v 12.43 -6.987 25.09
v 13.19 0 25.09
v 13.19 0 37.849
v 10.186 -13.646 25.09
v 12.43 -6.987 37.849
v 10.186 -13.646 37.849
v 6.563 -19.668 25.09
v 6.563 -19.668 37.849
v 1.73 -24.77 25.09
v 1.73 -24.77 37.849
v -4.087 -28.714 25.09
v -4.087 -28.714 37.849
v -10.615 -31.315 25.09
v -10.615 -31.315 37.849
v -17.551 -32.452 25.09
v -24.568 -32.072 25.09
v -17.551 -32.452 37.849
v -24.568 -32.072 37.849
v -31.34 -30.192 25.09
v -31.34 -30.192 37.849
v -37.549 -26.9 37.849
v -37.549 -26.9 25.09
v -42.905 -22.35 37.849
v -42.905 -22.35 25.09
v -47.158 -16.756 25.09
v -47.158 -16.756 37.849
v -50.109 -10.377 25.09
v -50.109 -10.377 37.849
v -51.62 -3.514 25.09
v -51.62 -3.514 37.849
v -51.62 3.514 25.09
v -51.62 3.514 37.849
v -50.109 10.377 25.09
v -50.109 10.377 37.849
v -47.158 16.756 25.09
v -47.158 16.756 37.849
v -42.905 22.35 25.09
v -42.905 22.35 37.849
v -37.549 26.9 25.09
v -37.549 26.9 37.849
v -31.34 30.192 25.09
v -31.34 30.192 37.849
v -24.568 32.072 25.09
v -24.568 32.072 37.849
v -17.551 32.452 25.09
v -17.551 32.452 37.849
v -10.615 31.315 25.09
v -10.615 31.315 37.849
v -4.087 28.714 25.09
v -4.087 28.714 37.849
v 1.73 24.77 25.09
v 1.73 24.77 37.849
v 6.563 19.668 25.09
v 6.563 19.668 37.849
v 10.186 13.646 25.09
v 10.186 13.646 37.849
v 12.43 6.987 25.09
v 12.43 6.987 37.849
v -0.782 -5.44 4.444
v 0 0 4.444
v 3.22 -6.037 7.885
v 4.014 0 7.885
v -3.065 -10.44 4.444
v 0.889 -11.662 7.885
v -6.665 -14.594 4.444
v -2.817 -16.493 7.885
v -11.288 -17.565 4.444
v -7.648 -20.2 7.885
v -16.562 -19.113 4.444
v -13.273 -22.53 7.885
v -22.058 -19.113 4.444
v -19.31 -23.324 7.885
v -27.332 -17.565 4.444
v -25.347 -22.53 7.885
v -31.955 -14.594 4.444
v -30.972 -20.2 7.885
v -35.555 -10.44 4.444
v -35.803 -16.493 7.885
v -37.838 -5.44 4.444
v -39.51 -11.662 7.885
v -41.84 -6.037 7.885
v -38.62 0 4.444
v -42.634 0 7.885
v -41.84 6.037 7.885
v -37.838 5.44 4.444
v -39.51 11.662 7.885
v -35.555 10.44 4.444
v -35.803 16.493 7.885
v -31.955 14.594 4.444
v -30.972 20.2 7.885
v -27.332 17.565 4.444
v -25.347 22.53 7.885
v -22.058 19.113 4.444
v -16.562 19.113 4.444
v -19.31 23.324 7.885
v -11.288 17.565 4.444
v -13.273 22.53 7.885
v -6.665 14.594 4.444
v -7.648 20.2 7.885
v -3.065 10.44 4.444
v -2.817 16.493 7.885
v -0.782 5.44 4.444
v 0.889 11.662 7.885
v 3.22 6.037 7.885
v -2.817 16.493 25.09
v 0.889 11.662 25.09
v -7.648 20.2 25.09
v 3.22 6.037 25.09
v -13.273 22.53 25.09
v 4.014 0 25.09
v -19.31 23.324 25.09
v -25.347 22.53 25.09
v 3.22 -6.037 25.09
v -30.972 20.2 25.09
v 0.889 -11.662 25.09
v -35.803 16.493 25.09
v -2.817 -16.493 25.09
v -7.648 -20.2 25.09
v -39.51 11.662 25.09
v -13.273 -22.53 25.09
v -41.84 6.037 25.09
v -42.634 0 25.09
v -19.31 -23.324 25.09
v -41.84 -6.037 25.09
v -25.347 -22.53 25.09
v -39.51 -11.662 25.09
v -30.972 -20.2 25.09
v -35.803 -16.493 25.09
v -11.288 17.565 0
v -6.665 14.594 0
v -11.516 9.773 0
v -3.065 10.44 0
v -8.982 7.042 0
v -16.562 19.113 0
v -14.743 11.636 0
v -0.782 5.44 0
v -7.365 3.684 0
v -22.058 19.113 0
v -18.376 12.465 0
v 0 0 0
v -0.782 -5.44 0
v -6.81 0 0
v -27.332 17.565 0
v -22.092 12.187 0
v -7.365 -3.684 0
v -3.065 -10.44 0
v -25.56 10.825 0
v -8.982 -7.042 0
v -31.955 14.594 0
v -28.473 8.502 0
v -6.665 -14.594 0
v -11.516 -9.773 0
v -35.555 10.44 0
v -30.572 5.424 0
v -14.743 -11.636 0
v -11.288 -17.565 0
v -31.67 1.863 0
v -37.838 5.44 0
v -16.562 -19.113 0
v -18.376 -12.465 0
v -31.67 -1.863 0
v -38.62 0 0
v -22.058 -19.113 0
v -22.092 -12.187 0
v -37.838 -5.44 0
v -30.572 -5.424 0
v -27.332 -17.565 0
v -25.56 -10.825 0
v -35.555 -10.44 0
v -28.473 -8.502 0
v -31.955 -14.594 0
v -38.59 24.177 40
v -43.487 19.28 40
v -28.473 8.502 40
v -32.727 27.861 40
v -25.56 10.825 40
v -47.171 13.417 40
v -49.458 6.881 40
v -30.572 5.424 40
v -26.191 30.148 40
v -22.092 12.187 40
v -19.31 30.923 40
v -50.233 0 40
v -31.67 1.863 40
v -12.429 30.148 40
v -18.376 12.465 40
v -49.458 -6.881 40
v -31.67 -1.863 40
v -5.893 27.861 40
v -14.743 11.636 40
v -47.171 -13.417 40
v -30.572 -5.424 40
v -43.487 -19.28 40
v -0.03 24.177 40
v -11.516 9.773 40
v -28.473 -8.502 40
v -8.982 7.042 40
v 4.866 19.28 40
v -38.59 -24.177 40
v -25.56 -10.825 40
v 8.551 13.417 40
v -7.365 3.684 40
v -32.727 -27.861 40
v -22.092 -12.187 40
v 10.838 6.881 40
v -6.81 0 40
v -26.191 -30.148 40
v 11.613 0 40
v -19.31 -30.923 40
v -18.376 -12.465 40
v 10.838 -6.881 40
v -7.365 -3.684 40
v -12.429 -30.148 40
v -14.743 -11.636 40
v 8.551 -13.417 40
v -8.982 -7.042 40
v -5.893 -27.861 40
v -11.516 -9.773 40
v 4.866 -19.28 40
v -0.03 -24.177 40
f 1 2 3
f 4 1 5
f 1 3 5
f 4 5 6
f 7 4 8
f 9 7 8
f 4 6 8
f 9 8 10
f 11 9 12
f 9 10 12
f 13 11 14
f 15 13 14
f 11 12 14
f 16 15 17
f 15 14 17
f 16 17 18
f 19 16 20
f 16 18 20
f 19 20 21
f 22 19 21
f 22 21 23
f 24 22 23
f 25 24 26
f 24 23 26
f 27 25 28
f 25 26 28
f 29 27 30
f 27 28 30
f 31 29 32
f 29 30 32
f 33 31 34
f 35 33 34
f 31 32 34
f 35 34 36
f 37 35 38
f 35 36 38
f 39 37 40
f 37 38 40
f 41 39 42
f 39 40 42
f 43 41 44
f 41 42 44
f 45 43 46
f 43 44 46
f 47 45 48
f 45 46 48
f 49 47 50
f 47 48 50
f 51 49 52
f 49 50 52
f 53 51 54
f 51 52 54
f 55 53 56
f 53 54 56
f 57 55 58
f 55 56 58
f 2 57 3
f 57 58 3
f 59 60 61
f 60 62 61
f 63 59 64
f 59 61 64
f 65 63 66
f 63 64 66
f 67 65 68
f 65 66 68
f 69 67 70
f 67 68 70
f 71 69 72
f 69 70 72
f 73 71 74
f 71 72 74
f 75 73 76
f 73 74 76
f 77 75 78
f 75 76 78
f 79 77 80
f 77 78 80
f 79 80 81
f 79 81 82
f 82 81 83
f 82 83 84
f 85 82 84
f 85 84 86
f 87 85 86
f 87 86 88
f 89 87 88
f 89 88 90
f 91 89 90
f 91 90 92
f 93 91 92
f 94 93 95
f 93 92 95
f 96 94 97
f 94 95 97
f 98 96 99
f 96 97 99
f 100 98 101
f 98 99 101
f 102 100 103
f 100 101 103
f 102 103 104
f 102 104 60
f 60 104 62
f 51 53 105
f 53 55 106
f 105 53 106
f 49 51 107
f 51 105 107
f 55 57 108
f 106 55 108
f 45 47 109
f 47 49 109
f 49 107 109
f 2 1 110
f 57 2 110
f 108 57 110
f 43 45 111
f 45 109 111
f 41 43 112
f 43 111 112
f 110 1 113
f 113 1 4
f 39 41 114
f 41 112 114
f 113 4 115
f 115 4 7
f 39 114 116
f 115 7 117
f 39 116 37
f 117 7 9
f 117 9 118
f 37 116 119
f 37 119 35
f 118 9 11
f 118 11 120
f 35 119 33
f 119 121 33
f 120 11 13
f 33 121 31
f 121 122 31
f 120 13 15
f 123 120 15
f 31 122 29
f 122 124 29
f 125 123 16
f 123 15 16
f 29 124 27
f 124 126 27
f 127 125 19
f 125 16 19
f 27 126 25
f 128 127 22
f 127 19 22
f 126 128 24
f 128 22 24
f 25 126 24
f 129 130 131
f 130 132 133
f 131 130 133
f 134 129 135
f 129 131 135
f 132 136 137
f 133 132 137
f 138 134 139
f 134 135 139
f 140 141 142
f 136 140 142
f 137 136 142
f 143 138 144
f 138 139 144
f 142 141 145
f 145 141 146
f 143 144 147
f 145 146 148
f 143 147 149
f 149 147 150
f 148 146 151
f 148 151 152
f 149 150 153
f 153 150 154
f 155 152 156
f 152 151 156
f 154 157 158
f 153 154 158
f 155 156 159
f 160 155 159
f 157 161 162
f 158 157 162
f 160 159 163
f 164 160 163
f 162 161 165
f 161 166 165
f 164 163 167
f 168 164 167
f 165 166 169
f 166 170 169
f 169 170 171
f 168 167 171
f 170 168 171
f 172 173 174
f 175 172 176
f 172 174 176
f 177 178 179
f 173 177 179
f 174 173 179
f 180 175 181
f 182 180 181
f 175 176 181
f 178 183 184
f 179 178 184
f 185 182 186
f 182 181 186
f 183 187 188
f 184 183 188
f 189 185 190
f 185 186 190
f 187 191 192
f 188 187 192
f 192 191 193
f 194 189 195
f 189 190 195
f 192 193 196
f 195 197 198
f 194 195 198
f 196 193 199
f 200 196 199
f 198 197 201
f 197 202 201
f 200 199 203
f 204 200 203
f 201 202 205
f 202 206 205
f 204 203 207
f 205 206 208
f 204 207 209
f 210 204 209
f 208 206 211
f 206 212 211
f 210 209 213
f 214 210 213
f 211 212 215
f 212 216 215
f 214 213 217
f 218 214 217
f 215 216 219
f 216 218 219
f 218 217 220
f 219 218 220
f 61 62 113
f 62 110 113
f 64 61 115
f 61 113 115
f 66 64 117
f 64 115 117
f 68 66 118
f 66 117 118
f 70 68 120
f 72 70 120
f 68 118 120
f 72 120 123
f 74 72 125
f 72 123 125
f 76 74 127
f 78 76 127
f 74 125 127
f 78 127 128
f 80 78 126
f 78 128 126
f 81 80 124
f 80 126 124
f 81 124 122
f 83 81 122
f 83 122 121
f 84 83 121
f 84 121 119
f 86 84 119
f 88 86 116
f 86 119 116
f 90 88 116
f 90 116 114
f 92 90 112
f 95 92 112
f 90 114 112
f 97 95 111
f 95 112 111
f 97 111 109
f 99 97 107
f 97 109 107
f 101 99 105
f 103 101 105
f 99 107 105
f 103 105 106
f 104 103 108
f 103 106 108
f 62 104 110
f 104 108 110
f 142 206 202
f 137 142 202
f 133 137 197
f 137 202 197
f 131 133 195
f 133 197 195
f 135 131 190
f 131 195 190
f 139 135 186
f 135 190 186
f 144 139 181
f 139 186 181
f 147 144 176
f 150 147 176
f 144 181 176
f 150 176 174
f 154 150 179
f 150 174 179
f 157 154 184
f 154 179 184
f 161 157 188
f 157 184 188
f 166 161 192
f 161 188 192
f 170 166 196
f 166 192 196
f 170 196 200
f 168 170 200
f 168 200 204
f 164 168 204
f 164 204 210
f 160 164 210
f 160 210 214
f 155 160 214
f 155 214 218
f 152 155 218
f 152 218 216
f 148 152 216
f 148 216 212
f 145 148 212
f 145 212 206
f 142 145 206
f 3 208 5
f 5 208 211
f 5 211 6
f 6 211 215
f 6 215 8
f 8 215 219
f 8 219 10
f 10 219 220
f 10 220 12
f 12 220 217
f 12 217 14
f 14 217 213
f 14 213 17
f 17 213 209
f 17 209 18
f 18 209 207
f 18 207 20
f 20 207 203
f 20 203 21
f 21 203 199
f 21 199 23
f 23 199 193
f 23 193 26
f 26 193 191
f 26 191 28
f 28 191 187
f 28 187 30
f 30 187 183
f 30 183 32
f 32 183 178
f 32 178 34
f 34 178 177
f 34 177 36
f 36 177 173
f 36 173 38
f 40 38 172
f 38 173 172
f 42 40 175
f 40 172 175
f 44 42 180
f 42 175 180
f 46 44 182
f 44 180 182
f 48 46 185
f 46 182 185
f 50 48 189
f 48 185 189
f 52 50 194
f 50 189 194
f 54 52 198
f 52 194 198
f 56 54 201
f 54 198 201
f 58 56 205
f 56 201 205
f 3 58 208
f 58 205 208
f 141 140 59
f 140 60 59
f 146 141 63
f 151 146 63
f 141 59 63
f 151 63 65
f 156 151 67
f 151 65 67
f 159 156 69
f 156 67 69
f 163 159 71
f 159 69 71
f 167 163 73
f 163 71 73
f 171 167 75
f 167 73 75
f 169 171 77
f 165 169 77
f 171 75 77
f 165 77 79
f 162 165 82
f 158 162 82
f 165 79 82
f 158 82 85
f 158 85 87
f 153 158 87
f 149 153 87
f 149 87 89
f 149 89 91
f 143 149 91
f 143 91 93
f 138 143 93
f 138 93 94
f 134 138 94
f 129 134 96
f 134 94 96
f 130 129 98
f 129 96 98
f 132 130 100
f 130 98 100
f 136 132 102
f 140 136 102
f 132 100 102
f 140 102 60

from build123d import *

# Parameters (mm, degrees)
F2_R     = 12.5
F3_DEPTH = 40.001


with BuildPart() as f1:
    # F0 (on Front) → F1 (revolve)
    with BuildSketch(Plane.XZ):
        Polygon((-19.310038, 0), (0, 0), (0, 4.444444), (4.014336, 7.885304), (4.014336, 25.089604), (13.189962, 25.089604), (13.189962, 37.849461), (11.612903, 40), (-19.310038, 40), align=None)
    revolve(axis=Axis((-19.310038, 0, 20), (0, 0, -1)))

    # F2 (on face) → F3 (cut, through all)
    with BuildSketch(Plane.XY.offset(40)):
        with Locations((-19.310038, 0)):
            Circle(F2_R)
    extrude(amount=-F3_DEPTH, mode=Mode.SUBTRACT)


solid = f1.part
